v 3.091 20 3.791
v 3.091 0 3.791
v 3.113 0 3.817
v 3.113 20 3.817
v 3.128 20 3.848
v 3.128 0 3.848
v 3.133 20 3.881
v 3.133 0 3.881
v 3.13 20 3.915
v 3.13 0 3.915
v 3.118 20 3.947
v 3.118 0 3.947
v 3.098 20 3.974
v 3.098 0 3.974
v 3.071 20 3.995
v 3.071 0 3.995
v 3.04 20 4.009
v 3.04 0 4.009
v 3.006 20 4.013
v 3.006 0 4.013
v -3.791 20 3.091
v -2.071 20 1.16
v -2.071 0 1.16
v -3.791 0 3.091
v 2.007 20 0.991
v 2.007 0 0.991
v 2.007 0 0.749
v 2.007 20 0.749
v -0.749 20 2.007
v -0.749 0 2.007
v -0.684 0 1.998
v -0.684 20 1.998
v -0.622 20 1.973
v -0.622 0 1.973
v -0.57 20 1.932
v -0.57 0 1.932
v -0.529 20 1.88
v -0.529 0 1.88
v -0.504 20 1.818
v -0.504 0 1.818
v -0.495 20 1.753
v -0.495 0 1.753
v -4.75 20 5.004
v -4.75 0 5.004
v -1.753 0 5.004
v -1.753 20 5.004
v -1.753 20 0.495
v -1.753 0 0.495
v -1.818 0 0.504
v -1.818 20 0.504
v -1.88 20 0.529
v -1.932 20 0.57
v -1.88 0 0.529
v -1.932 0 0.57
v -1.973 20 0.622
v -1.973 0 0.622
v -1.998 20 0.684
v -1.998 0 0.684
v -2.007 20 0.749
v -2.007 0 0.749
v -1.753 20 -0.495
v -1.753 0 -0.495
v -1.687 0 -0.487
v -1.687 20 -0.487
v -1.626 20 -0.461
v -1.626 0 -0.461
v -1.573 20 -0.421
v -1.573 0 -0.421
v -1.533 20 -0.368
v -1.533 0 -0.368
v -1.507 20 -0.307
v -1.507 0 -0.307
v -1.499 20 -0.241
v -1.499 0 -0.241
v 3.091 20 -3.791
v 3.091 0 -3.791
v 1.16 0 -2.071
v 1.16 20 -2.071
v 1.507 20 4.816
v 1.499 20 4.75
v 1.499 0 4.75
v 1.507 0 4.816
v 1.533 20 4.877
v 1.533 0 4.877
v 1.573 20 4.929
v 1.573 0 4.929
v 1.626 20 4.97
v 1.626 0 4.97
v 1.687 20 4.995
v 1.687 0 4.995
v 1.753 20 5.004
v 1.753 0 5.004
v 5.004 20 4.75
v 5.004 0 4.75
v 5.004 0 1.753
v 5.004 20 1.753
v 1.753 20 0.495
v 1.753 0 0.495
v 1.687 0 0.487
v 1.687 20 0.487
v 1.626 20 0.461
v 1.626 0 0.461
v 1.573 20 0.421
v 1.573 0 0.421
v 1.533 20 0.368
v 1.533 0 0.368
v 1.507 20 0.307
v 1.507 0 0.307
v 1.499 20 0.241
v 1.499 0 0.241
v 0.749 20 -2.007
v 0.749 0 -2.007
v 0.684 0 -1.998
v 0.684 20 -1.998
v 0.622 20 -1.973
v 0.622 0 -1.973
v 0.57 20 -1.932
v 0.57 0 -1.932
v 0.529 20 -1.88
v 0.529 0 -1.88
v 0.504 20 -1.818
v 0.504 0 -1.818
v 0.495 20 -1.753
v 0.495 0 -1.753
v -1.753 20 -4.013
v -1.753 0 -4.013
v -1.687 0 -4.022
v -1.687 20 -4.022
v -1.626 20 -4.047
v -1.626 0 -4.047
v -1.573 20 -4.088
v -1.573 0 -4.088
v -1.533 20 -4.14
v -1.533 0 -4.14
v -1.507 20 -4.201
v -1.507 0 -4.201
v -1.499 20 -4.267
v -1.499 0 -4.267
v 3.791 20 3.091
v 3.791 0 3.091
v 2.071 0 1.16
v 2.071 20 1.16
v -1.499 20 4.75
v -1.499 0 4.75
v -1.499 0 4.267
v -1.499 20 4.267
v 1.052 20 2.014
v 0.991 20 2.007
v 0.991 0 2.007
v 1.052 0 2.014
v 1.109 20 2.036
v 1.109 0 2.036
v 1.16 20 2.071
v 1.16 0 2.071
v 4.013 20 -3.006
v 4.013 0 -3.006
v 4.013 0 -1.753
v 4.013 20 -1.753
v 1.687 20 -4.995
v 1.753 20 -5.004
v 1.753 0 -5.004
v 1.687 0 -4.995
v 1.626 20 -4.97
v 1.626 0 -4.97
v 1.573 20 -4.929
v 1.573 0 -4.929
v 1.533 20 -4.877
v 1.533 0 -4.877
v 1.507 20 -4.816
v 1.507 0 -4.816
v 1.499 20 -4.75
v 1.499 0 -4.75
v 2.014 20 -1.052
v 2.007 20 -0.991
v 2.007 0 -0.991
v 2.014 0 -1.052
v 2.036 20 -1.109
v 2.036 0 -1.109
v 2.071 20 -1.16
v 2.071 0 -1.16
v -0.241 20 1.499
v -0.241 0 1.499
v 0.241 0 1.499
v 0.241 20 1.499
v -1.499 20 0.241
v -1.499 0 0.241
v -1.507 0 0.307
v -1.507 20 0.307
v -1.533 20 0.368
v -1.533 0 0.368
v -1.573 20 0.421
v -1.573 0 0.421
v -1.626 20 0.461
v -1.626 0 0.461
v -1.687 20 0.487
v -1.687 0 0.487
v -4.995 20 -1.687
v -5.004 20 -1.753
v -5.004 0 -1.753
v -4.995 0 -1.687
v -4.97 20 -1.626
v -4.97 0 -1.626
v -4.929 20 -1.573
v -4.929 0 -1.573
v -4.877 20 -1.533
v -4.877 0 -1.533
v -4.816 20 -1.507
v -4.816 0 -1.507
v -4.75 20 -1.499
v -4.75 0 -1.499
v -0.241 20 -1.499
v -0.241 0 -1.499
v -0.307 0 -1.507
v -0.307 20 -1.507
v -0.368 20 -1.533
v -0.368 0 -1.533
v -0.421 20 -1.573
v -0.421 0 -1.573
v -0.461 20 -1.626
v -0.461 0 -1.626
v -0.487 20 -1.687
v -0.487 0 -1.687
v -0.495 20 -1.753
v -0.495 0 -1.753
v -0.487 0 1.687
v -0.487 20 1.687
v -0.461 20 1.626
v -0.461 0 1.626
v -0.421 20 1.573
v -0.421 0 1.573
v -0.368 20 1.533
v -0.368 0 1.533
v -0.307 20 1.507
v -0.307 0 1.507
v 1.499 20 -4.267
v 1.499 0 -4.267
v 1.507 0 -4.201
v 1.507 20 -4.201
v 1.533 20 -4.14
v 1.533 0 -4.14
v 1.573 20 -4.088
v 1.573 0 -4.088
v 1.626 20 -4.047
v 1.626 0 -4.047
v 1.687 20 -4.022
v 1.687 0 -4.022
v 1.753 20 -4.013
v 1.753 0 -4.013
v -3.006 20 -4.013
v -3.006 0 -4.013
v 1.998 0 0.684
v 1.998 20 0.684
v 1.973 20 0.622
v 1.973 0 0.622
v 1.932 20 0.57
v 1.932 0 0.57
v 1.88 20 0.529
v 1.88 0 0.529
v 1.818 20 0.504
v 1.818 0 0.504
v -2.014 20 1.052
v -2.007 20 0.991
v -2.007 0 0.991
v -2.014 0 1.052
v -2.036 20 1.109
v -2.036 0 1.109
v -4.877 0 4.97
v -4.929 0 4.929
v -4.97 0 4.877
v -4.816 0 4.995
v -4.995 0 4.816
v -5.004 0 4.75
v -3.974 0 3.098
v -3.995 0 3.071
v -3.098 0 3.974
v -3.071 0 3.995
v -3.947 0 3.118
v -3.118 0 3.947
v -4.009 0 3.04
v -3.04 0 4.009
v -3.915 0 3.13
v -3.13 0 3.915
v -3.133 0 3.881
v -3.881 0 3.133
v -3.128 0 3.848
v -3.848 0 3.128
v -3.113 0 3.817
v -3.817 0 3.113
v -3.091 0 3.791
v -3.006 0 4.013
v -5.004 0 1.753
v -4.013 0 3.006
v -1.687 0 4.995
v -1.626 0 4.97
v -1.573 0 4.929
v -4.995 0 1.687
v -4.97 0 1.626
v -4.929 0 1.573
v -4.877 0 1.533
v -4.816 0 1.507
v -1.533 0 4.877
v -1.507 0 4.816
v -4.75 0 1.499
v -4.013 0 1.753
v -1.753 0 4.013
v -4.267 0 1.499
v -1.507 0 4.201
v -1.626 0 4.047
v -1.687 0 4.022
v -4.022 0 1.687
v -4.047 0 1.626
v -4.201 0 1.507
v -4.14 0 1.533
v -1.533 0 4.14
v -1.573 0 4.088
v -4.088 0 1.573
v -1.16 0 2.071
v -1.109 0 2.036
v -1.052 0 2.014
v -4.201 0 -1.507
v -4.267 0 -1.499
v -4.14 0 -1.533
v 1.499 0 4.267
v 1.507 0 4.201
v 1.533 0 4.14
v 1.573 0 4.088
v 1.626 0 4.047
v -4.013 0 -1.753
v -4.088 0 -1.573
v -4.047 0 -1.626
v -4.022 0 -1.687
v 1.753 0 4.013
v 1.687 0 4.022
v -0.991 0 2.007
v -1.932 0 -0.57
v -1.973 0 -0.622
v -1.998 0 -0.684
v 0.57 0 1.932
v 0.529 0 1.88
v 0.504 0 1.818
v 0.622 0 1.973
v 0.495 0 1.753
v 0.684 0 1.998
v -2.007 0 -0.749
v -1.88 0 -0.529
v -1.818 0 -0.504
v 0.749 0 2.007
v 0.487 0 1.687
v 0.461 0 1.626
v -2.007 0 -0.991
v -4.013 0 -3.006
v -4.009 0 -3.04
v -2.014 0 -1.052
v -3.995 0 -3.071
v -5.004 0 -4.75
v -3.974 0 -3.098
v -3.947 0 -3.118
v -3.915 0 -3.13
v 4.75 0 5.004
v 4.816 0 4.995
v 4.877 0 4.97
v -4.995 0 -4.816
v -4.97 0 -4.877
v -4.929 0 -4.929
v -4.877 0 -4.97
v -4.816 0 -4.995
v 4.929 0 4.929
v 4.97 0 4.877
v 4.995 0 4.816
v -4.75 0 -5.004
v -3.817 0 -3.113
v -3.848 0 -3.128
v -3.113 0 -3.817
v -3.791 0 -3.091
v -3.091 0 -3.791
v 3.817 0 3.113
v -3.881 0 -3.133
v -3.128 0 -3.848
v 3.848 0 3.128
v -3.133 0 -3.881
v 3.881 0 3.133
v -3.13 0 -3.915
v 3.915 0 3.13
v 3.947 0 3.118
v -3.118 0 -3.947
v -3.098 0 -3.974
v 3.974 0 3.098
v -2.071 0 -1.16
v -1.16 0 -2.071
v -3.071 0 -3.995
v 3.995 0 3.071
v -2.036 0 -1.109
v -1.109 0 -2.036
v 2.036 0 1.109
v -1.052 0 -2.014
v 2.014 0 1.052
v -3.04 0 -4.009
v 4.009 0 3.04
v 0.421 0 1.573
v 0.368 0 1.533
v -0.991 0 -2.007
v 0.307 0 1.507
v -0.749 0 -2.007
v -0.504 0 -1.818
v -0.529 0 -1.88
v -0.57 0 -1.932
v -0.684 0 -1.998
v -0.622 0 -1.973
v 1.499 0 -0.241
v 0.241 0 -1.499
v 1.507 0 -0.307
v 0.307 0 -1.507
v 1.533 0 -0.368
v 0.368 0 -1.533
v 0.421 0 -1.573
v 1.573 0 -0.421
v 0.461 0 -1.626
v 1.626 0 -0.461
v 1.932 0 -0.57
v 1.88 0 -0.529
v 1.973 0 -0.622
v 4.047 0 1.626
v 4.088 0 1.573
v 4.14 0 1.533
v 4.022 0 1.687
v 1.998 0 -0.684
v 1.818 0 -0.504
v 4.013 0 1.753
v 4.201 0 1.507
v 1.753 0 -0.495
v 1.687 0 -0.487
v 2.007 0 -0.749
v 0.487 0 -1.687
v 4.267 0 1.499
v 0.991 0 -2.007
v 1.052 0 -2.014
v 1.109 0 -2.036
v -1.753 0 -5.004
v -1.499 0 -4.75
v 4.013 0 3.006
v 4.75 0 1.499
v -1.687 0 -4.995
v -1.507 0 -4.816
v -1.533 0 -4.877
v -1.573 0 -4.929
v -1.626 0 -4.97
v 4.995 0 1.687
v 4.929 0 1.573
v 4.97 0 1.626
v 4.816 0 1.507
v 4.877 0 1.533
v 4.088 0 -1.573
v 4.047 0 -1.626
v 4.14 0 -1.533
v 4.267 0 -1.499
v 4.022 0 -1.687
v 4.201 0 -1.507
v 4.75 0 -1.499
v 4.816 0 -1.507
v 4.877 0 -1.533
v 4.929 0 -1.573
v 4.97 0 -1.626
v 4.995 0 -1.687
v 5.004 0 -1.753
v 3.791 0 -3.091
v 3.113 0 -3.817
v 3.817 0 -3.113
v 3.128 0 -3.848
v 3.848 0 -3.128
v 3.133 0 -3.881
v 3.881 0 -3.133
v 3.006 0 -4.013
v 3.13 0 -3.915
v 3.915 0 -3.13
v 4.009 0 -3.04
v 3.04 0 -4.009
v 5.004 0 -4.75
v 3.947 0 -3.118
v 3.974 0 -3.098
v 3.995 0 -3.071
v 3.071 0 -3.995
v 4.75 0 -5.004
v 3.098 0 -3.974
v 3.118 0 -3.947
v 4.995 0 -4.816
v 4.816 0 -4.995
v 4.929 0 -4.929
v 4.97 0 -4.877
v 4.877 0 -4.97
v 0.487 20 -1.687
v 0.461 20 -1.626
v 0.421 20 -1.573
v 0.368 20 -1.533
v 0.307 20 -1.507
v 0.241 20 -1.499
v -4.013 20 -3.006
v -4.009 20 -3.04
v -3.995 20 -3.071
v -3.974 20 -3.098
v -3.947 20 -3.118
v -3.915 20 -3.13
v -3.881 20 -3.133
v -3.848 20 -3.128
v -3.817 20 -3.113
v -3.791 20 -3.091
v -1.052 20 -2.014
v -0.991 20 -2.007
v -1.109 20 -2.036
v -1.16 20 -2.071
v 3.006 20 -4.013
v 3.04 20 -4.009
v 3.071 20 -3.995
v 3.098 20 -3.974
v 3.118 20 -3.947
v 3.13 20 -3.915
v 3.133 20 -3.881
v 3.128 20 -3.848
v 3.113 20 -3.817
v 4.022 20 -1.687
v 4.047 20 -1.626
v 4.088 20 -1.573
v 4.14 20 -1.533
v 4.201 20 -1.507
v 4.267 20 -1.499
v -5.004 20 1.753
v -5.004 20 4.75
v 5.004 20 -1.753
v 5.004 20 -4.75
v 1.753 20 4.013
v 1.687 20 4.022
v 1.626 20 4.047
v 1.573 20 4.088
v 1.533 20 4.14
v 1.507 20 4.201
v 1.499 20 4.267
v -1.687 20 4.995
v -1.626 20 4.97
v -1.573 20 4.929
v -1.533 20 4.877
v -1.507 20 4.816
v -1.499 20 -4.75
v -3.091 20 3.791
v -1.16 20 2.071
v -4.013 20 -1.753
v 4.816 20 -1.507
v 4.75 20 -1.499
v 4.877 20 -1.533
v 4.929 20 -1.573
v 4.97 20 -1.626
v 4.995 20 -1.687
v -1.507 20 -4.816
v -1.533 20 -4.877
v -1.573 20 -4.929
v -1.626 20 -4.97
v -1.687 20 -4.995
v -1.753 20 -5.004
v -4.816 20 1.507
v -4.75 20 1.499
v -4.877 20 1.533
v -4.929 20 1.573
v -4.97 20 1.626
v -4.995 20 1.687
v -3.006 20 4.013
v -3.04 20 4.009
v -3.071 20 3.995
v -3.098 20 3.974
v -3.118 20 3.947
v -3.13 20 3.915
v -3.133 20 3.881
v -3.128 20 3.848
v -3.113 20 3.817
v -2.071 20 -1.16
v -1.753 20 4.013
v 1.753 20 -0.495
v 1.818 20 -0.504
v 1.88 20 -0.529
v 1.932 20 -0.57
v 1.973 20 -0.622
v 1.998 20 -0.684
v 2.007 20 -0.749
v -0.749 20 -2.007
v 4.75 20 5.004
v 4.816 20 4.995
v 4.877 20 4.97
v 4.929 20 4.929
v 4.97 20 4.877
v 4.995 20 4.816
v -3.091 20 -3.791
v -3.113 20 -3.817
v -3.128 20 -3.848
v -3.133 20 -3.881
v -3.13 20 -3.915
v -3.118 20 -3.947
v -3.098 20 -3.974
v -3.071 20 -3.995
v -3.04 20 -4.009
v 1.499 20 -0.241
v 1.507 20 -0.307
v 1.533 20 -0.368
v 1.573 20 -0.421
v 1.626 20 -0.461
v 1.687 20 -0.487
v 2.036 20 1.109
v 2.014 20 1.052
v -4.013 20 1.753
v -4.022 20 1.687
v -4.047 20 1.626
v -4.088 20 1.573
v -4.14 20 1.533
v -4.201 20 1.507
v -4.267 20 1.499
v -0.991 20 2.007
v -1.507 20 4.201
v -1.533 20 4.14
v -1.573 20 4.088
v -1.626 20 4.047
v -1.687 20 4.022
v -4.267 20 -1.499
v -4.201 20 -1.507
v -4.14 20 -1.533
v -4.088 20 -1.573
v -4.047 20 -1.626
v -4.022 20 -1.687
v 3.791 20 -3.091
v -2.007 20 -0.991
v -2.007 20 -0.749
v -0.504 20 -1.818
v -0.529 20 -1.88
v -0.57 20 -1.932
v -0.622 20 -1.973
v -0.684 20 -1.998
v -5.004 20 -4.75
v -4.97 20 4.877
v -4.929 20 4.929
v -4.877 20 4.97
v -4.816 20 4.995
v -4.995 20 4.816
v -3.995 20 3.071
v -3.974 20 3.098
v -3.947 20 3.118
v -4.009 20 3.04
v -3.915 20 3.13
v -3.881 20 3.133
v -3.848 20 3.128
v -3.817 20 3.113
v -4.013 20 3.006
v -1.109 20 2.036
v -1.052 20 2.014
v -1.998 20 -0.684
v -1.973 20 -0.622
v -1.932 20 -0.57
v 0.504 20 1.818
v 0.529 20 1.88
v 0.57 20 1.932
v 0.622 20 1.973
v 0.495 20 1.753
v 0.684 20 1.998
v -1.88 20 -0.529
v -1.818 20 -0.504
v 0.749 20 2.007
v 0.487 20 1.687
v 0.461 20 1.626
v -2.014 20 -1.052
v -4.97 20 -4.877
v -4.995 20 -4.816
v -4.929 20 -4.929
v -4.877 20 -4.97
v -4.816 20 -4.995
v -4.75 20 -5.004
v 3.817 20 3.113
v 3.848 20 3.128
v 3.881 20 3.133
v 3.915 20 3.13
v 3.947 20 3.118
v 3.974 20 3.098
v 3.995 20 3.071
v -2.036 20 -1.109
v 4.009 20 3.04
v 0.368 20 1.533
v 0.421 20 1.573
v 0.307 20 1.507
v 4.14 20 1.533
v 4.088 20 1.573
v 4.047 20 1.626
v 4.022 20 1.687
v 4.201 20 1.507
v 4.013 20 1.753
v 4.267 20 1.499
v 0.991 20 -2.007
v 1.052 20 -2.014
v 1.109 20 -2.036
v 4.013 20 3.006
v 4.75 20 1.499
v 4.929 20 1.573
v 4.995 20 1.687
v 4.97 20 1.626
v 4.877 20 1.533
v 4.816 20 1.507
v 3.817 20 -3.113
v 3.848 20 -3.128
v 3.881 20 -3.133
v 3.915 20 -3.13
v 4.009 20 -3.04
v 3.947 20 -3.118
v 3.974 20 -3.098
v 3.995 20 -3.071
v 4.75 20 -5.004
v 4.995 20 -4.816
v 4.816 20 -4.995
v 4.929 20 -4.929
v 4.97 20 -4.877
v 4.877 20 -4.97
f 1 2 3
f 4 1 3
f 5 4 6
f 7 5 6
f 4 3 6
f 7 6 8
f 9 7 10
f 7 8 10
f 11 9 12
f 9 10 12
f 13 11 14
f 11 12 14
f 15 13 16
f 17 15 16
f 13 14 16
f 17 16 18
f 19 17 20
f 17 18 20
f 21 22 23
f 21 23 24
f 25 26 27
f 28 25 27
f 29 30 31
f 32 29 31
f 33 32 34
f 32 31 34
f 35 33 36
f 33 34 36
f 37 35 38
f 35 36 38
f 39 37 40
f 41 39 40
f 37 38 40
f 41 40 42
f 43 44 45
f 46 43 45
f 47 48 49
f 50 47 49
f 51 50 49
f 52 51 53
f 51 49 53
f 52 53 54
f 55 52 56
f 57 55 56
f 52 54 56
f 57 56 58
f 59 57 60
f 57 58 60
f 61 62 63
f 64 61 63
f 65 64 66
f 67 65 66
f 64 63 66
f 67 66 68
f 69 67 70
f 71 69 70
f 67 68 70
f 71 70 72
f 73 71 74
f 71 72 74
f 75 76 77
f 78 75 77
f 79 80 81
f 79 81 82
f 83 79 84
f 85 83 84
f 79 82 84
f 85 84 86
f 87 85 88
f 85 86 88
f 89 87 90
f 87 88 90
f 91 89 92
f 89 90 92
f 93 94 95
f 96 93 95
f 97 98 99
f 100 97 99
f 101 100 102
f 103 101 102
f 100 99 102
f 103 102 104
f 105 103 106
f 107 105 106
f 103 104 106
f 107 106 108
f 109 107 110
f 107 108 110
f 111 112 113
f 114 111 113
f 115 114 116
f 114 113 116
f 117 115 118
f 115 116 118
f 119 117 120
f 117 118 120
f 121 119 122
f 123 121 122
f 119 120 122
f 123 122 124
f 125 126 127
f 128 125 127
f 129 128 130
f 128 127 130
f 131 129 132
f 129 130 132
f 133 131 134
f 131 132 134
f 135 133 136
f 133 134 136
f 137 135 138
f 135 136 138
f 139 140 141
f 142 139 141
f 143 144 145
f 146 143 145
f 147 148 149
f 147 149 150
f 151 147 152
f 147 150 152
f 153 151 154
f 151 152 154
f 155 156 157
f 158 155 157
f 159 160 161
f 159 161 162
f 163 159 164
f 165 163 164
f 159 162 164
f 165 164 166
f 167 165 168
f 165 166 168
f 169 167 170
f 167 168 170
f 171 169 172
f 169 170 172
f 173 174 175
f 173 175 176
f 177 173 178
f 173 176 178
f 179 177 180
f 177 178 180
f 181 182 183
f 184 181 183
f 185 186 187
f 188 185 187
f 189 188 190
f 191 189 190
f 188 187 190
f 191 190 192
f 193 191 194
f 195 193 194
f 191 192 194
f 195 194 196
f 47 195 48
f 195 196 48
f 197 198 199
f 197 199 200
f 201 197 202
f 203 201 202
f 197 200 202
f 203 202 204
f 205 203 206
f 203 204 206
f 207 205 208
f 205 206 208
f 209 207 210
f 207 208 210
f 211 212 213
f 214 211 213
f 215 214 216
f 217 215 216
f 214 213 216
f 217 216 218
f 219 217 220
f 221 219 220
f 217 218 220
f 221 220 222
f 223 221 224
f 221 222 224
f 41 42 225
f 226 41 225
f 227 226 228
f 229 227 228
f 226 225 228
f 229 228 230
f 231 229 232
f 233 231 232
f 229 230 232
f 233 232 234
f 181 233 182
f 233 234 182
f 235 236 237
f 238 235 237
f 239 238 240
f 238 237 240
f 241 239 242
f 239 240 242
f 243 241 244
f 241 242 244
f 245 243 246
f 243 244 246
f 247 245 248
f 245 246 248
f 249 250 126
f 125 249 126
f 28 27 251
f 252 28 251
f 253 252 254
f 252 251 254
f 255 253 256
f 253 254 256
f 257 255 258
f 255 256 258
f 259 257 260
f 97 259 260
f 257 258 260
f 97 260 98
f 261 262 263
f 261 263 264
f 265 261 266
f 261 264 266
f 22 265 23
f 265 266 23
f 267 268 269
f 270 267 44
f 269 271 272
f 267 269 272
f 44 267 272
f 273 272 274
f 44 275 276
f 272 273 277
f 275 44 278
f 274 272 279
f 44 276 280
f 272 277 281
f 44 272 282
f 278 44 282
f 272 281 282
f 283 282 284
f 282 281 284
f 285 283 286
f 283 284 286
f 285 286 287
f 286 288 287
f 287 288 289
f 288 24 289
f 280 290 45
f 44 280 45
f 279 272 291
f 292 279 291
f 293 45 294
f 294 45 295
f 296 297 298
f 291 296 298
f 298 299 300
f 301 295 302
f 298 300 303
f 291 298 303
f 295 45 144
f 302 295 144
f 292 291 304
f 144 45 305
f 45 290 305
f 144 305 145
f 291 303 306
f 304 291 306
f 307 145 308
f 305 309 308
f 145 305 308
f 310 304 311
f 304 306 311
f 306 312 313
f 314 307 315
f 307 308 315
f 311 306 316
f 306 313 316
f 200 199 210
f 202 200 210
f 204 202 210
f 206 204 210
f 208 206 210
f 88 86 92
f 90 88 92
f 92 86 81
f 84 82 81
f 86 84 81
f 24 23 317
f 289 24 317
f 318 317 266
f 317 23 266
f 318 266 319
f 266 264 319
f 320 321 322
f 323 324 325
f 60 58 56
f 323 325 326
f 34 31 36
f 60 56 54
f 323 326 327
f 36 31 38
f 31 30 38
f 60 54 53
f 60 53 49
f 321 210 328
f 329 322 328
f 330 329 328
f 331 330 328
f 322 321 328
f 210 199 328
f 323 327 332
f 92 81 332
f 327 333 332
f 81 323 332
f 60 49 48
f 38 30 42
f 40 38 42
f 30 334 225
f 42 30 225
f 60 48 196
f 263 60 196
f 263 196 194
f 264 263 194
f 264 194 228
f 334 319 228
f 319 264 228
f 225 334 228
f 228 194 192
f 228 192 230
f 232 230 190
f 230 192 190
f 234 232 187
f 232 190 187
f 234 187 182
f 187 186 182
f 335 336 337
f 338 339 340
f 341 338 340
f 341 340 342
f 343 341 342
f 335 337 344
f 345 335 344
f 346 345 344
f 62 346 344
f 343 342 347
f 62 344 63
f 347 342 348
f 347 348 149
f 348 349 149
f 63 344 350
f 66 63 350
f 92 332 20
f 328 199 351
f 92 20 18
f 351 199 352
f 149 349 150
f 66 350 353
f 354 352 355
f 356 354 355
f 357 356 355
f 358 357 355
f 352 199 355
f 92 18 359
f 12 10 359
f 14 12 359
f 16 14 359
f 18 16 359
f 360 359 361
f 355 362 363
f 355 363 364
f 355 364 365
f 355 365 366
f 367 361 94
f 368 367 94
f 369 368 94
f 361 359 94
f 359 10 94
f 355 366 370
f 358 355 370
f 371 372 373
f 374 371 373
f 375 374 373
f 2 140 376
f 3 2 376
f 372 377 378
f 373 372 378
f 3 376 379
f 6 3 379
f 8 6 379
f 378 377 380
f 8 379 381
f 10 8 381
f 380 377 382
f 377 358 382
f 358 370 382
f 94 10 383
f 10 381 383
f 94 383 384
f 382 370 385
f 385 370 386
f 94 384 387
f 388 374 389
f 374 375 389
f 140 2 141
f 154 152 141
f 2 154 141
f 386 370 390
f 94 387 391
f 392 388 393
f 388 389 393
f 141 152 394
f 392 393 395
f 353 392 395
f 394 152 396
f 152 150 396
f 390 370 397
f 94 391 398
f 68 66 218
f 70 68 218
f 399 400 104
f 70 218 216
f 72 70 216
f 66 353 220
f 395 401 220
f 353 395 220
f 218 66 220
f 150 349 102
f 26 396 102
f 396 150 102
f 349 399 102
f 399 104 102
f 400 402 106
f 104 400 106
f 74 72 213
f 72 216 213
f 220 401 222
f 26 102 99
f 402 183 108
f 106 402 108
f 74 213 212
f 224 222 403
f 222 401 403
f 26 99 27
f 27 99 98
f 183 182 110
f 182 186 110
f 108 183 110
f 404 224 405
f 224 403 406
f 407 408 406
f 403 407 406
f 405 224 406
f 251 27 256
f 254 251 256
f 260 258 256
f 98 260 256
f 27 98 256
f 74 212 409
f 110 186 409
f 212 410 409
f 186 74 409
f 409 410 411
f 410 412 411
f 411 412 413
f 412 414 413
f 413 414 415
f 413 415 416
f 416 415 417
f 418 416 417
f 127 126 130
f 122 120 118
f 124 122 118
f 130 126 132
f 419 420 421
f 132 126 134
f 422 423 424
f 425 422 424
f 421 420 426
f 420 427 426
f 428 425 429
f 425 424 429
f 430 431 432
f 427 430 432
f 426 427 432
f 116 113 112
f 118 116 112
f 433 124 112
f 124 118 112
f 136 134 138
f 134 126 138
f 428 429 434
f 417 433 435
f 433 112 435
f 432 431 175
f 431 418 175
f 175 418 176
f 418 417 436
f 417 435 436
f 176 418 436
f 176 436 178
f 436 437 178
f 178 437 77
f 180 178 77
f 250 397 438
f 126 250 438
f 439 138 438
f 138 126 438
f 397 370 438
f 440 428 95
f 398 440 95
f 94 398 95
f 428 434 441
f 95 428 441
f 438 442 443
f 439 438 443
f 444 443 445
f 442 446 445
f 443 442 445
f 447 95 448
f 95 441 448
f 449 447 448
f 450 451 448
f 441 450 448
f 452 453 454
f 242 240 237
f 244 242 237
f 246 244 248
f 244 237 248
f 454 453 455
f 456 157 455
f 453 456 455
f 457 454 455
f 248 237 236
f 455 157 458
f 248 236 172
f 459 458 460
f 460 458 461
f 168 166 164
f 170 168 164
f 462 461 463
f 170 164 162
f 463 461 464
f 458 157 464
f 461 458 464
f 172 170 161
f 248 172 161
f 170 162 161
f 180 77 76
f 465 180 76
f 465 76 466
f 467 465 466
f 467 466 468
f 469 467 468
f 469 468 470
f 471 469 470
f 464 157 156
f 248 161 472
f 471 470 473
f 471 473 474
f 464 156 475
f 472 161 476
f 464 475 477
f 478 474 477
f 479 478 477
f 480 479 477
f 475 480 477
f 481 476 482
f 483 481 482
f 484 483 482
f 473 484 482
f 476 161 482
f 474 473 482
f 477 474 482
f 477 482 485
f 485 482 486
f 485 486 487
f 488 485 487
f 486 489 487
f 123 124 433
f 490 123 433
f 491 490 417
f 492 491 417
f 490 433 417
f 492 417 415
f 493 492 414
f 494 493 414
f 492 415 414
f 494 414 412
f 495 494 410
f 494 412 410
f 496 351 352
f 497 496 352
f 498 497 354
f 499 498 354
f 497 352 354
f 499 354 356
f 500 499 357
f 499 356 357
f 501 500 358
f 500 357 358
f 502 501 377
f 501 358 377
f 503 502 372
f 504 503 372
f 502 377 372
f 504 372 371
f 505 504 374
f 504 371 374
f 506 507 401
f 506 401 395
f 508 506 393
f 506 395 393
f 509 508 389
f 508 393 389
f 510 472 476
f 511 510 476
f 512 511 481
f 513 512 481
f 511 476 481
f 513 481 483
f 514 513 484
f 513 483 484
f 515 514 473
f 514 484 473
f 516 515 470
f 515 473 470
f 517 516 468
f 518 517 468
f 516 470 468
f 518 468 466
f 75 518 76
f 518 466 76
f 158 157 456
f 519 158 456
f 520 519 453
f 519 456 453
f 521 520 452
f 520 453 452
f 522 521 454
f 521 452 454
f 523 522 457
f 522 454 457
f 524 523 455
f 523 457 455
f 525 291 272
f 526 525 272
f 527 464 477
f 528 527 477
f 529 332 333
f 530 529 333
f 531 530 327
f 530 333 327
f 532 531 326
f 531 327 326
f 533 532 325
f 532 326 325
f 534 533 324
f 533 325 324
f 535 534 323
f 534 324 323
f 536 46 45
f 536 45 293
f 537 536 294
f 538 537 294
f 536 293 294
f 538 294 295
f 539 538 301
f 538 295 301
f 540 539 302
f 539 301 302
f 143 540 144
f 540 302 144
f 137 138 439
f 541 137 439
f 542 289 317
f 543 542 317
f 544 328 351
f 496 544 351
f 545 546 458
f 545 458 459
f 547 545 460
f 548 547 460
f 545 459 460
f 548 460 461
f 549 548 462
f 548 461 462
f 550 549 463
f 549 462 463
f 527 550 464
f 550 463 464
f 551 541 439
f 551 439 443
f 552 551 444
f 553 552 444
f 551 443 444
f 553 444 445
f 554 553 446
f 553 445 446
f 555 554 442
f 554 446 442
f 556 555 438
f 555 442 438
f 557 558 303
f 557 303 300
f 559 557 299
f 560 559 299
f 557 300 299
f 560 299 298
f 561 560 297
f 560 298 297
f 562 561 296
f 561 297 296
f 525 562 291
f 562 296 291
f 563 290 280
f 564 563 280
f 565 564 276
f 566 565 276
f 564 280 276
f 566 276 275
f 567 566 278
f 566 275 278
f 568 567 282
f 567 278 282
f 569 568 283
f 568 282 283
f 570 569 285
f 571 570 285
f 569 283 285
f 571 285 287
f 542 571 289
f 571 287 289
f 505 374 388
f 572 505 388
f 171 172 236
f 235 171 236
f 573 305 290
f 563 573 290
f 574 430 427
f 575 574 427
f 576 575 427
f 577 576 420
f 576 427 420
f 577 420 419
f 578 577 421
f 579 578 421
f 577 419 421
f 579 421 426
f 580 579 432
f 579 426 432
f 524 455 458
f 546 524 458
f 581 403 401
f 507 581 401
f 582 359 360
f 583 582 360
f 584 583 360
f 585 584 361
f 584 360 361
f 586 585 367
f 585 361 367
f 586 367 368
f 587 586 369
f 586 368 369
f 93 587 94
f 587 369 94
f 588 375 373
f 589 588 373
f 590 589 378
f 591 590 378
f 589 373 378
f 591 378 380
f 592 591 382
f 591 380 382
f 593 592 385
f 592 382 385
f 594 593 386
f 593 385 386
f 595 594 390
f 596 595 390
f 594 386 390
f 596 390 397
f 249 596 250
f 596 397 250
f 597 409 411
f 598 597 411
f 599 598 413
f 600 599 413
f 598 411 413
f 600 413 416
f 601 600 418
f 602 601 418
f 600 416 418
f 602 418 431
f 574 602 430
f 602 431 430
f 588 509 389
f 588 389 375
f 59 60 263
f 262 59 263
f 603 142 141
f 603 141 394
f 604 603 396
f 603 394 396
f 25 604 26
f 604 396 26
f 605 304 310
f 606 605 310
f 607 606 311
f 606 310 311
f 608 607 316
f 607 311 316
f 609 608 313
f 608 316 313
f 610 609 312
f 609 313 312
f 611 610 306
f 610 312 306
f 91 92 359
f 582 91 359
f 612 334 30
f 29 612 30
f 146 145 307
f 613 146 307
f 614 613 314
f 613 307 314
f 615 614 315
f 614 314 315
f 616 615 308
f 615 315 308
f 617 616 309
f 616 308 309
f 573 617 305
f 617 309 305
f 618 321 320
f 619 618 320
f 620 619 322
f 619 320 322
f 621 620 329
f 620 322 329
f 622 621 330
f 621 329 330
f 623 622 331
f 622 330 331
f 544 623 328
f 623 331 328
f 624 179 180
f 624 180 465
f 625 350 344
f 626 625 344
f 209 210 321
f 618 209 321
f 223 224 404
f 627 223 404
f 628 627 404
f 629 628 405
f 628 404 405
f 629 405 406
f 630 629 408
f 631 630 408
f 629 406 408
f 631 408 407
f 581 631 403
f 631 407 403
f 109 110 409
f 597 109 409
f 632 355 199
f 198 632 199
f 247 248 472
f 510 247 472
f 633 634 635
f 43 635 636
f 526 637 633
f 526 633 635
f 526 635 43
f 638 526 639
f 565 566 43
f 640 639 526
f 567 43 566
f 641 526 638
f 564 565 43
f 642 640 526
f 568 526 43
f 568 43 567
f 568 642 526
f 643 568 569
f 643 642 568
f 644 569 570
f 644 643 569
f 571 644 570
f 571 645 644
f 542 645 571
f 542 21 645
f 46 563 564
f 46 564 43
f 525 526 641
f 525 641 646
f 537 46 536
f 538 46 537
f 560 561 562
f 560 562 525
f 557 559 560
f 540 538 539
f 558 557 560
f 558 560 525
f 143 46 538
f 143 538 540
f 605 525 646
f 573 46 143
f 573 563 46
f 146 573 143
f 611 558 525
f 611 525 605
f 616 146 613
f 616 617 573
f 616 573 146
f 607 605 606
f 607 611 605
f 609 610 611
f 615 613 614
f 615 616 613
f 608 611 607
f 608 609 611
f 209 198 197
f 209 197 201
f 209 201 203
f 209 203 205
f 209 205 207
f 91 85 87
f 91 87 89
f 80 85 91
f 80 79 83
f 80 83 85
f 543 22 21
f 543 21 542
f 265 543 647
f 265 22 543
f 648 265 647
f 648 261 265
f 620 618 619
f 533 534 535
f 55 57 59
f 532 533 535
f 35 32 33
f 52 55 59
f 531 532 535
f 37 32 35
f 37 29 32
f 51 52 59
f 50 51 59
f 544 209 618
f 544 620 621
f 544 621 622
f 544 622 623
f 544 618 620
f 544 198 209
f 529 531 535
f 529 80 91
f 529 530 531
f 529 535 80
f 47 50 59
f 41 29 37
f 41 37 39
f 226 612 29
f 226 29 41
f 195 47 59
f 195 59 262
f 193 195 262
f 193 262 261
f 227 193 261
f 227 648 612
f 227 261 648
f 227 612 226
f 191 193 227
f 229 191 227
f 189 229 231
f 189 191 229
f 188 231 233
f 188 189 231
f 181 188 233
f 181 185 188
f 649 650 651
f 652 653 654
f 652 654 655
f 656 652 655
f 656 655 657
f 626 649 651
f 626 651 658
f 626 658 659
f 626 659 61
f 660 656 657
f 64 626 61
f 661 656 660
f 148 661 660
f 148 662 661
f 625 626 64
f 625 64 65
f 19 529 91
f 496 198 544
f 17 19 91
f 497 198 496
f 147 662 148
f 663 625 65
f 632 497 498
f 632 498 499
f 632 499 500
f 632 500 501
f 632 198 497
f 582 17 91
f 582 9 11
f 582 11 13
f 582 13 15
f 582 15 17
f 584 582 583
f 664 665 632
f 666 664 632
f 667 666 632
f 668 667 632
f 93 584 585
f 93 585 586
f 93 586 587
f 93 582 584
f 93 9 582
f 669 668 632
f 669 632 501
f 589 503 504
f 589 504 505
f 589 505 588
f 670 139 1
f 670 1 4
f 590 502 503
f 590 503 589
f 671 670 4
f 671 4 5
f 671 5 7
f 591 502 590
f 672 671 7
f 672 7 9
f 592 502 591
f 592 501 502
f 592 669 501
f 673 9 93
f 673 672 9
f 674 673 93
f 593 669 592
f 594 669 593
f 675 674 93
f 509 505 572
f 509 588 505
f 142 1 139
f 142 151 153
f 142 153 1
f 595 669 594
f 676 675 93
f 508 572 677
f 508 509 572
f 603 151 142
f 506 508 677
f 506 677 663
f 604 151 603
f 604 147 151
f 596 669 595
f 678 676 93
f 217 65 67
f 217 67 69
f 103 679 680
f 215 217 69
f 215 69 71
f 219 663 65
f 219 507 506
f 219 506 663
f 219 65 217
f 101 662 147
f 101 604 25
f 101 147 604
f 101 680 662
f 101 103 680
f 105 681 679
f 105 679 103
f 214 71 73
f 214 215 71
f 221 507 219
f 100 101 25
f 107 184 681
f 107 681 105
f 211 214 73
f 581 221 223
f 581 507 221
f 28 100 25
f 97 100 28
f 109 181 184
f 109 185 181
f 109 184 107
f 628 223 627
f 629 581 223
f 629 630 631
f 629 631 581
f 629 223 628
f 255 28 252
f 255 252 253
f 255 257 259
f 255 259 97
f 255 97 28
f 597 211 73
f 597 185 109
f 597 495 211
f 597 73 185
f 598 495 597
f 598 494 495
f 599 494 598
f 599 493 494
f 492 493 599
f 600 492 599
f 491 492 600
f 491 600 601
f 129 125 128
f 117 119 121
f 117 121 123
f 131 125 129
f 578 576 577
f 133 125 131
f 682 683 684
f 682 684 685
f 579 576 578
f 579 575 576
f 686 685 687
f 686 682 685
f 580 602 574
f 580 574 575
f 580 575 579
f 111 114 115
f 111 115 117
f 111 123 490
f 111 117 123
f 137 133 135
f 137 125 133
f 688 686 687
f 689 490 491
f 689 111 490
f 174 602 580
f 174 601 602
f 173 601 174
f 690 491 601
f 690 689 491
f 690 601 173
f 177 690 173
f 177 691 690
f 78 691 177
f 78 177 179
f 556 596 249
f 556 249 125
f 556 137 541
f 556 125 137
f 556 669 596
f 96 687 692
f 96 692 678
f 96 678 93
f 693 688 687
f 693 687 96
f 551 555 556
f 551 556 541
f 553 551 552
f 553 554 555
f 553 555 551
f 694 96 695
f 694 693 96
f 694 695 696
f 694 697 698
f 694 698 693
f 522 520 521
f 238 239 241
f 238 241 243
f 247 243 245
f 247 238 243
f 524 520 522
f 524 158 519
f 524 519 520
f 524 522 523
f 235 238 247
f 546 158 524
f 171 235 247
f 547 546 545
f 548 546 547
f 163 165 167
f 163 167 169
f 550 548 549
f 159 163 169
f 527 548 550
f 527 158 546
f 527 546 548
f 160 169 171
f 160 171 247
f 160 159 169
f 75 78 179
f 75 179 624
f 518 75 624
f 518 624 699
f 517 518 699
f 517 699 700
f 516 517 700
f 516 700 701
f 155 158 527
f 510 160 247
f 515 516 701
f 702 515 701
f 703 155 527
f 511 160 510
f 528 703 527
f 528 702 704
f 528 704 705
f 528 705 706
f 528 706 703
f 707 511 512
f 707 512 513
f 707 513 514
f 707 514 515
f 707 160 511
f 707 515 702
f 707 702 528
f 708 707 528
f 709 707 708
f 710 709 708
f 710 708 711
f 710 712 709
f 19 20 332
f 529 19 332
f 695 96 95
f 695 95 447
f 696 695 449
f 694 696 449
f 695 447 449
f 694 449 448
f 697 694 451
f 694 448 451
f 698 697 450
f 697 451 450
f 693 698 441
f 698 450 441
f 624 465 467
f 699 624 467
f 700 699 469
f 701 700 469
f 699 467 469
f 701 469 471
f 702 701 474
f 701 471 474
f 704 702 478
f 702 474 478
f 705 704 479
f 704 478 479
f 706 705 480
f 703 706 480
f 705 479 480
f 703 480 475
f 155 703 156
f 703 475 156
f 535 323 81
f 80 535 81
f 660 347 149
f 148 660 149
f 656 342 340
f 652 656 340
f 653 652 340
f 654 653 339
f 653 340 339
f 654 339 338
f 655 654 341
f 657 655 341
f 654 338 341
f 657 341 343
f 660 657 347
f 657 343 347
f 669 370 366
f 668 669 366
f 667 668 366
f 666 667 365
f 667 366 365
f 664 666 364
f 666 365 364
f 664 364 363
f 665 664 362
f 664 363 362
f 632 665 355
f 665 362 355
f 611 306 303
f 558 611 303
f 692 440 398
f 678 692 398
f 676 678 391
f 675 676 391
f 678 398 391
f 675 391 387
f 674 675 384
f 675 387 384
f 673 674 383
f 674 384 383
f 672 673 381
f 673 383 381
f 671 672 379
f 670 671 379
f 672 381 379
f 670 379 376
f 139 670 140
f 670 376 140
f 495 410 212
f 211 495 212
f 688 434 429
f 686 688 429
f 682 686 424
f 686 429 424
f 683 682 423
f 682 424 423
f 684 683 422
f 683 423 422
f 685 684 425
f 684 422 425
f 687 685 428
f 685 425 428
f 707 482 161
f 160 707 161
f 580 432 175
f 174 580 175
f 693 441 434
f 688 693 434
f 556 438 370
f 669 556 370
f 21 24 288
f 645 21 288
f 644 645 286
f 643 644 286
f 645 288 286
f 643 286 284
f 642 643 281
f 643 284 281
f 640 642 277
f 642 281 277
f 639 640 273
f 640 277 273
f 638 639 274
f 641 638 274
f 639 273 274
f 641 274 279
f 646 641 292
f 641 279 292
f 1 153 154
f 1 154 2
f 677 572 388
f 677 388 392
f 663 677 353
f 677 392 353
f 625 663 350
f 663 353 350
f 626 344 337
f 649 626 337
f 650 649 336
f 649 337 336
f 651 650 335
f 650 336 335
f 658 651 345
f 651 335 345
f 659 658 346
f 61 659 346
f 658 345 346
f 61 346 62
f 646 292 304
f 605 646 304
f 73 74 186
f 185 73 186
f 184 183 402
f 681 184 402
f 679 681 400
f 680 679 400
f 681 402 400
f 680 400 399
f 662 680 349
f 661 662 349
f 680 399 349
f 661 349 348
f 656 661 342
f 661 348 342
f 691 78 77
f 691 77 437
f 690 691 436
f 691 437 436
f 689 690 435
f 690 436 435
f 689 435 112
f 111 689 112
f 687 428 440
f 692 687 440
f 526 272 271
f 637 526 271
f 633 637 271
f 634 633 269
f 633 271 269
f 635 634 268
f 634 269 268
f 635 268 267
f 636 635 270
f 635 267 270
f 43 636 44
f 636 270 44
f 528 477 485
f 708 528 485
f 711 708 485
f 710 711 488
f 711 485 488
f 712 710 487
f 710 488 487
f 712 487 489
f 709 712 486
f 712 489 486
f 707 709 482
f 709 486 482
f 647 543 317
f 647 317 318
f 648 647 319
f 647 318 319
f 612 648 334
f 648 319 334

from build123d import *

# Parameters (mm, degrees)
BOSS_EXTRUDE1_DEPTH = 20.0000108


with BuildPart() as part:
    # Sketch1 → Boss-Extrude1 (new body)
    with BuildSketch(Plane(origin=(0, 0, 0), x_dir=(1, 0, 0), z_dir=(0, 1, 0))):
        with BuildLine():
            Line((-1.159549536, 2.070936998), (-3.090908521, 3.791368499))
            ThreePointArc((-3.090908521, 3.791368499), (-3.125119474, 3.931396235), (-3.006433754, 4.0132))
            Line((-3.006433754, 4.0132), (-1.7526, 4.0132))
            ThreePointArc((-1.7526, 4.0132), (-1.572994878, 4.087594878), (-1.4986, 4.2672))
            Line((-1.4986, 4.2672), (-1.4986, 4.7498))
            ThreePointArc((-1.4986, 4.7498), (-1.572994878, 4.929405122), (-1.7526, 5.0038))
            Line((-1.7526, 5.0038), (-4.7498, 5.0038))
            ThreePointArc((-4.7498, 5.0038), (-4.929405122, 4.929405122), (-5.0038, 4.7498))
            Line((-5.0038, 4.7498), (-5.0038, 1.7526))
            ThreePointArc((-5.0038, 1.7526), (-4.929405122, 1.572994878), (-4.7498, 1.4986))
            Line((-4.7498, 1.4986), (-4.2672, 1.4986))
            ThreePointArc((-4.2672, 1.4986), (-4.087594878, 1.572994878), (-4.0132, 1.7526))
            Line((-4.0132, 1.7526), (-4.0132, 3.006433754))
            ThreePointArc((-4.0132, 3.006433754), (-3.931396235, 3.125119474), (-3.791368499, 3.090908521))
            Line((-3.791368499, 3.090908521), (-2.070936998, 1.159549536))
            ThreePointArc((-2.070936998, 1.159549536), (-2.023228558, 1.08099247), (-2.0066, 0.9906))
            Line((-2.0066, 0.9906), (-2.0066, 0.7493))
            ThreePointArc((-2.0066, 0.7493), (-1.932205122, 0.569694878), (-1.7526, 0.4953))
            ThreePointArc((-1.7526, 0.4953), (-1.572994878, 0.420905122), (-1.4986, 0.2413))
            Line((-1.4986, 0.2413), (-1.4986, -0.2413))
            ThreePointArc((-1.4986, -0.2413), (-1.572994878, -0.420905122), (-1.7526, -0.4953))
            ThreePointArc((-1.7526, -0.4953), (-1.932205122, -0.569694878), (-2.0066, -0.7493))
            Line((-2.0066, -0.7493), (-2.0066, -0.9906))
            ThreePointArc((-2.0066, -0.9906), (-2.023228558, -1.08099247), (-2.070936998, -1.159549536))
            Line((-2.070936998, -1.159549536), (-3.791368499, -3.090908521))
            ThreePointArc((-3.791368499, -3.090908521), (-3.931396235, -3.125119474), (-4.0132, -3.006433754))
            Line((-4.0132, -3.006433754), (-4.0132, -1.7526))
            ThreePointArc((-4.0132, -1.7526), (-4.087594878, -1.572994878), (-4.2672, -1.4986))
            Line((-4.2672, -1.4986), (-4.7498, -1.4986))
            ThreePointArc((-4.7498, -1.4986), (-4.929405122, -1.572994878), (-5.0038, -1.7526))
            Line((-5.0038, -1.7526), (-5.0038, -4.7498))
            ThreePointArc((-5.0038, -4.7498), (-4.929405122, -4.929405122), (-4.7498, -5.0038))
            Line((-4.7498, -5.0038), (-1.7526, -5.0038))
            ThreePointArc((-1.7526, -5.0038), (-1.572994878, -4.929405122), (-1.4986, -4.7498))
            Line((-1.4986, -4.7498), (-1.4986, -4.2672))
            ThreePointArc((-1.4986, -4.2672), (-1.572994878, -4.087594878), (-1.7526, -4.0132))
            Line((-1.7526, -4.0132), (-3.006433754, -4.0132))
            ThreePointArc((-3.006433754, -4.0132), (-3.125119474, -3.931396235), (-3.090908521, -3.791368499))
            Line((-3.090908521, -3.791368499), (-1.159549536, -2.070936998))
            ThreePointArc((-1.159549536, -2.070936998), (-1.08099247, -2.023228558), (-0.9906, -2.0066))
            Line((-0.9906, -2.0066), (-0.7493, -2.0066))
            ThreePointArc((-0.7493, -2.0066), (-0.569694878, -1.932205122), (-0.4953, -1.7526))
            ThreePointArc((-0.4953, -1.7526), (-0.420905122, -1.572994878), (-0.2413, -1.4986))
            Line((-0.2413, -1.4986), (0.2413, -1.4986))
            ThreePointArc((0.2413, -1.4986), (0.420905122, -1.572994878), (0.4953, -1.7526))
            ThreePointArc((0.4953, -1.7526), (0.569694878, -1.932205122), (0.7493, -2.0066))
            Line((0.7493, -2.0066), (0.9906, -2.0066))
            ThreePointArc((0.9906, -2.0066), (1.08099247, -2.023228558), (1.159549536, -2.070936998))
            Line((1.159549536, -2.070936998), (3.090908521, -3.791368499))
            ThreePointArc((3.090908521, -3.791368499), (3.125119474, -3.931396235), (3.006433754, -4.0132))
            Line((3.006433754, -4.0132), (1.7526, -4.0132))
            ThreePointArc((1.7526, -4.0132), (1.572994878, -4.087594878), (1.4986, -4.2672))
            Line((1.4986, -4.2672), (1.4986, -4.7498))
            ThreePointArc((1.4986, -4.7498), (1.572994878, -4.929405122), (1.7526, -5.0038))
            Line((1.7526, -5.0038), (4.7498, -5.0038))
            ThreePointArc((4.7498, -5.0038), (4.929405122, -4.929405122), (5.0038, -4.7498))
            Line((5.0038, -4.7498), (5.0038, -1.7526))
            ThreePointArc((5.0038, -1.7526), (4.929405122, -1.572994878), (4.7498, -1.4986))
            Line((4.7498, -1.4986), (4.2672, -1.4986))
            ThreePointArc((4.2672, -1.4986), (4.087594878, -1.572994878), (4.0132, -1.7526))
            Line((4.0132, -1.7526), (4.0132, -3.006433754))
            ThreePointArc((4.0132, -3.006433754), (3.931396235, -3.125119474), (3.791368499, -3.090908521))
            Line((3.791368499, -3.090908521), (2.070936998, -1.159549536))
            ThreePointArc((2.070936998, -1.159549536), (2.023228558, -1.08099247), (2.0066, -0.9906))
            Line((2.0066, -0.9906), (2.0066, -0.7493))
            ThreePointArc((2.0066, -0.7493), (1.932205122, -0.569694878), (1.7526, -0.4953))
            ThreePointArc((1.7526, -0.4953), (1.572994878, -0.420905122), (1.4986, -0.2413))
            Line((1.4986, -0.2413), (1.4986, 0.2413))
            ThreePointArc((1.4986, 0.2413), (1.572994878, 0.420905122), (1.7526, 0.4953))
            ThreePointArc((1.7526, 0.4953), (1.932205122, 0.569694878), (2.0066, 0.7493))
            Line((2.0066, 0.7493), (2.0066, 0.9906))
            ThreePointArc((2.0066, 0.9906), (2.023228558, 1.08099247), (2.070936998, 1.159549536))
            Line((2.070936998, 1.159549536), (3.791368499, 3.090908521))
            ThreePointArc((3.791368499, 3.090908521), (3.931396235, 3.125119474), (4.0132, 3.006433754))
            Line((4.0132, 3.006433754), (4.0132, 1.7526))
            ThreePointArc((4.0132, 1.7526), (4.087594878, 1.572994878), (4.2672, 1.4986))
            Line((4.2672, 1.4986), (4.7498, 1.4986))
            ThreePointArc((4.7498, 1.4986), (4.929405122, 1.572994878), (5.0038, 1.7526))
            Line((5.0038, 1.7526), (5.0038, 4.7498))
            ThreePointArc((5.0038, 4.7498), (4.929405122, 4.929405122), (4.7498, 5.0038))
            Line((4.7498, 5.0038), (1.7526, 5.0038))
            ThreePointArc((1.7526, 5.0038), (1.572994878, 4.929405122), (1.4986, 4.7498))
            Line((1.4986, 4.7498), (1.4986, 4.2672))
            ThreePointArc((1.4986, 4.2672), (1.572994878, 4.087594878), (1.7526, 4.0132))
            Line((1.7526, 4.0132), (3.006433754, 4.0132))
            ThreePointArc((3.006433754, 4.0132), (3.125119474, 3.931396235), (3.090908521, 3.791368499))
            Line((3.090908521, 3.791368499), (1.159549536, 2.070936998))
            ThreePointArc((1.159549536, 2.070936998), (1.08099247, 2.023228558), (0.9906, 2.0066))
            Line((0.9906, 2.0066), (0.7493, 2.0066))
            ThreePointArc((0.7493, 2.0066), (0.569694878, 1.932205122), (0.4953, 1.7526))
            ThreePointArc((0.4953, 1.7526), (0.420905122, 1.572994878), (0.2413, 1.4986))
            Line((0.2413, 1.4986), (-0.2413, 1.4986))
            ThreePointArc((-0.2413, 1.4986), (-0.420905122, 1.572994878), (-0.4953, 1.7526))
            ThreePointArc((-0.4953, 1.7526), (-0.569694878, 1.932205122), (-0.7493, 2.0066))
            Line((-0.7493, 2.0066), (-0.9906, 2.0066))
            ThreePointArc((-0.9906, 2.0066), (-1.08099247, 2.023228558), (-1.159549536, 2.070936998))
        make_face()
    extrude(amount=BOSS_EXTRUDE1_DEPTH)


solid = part.part
